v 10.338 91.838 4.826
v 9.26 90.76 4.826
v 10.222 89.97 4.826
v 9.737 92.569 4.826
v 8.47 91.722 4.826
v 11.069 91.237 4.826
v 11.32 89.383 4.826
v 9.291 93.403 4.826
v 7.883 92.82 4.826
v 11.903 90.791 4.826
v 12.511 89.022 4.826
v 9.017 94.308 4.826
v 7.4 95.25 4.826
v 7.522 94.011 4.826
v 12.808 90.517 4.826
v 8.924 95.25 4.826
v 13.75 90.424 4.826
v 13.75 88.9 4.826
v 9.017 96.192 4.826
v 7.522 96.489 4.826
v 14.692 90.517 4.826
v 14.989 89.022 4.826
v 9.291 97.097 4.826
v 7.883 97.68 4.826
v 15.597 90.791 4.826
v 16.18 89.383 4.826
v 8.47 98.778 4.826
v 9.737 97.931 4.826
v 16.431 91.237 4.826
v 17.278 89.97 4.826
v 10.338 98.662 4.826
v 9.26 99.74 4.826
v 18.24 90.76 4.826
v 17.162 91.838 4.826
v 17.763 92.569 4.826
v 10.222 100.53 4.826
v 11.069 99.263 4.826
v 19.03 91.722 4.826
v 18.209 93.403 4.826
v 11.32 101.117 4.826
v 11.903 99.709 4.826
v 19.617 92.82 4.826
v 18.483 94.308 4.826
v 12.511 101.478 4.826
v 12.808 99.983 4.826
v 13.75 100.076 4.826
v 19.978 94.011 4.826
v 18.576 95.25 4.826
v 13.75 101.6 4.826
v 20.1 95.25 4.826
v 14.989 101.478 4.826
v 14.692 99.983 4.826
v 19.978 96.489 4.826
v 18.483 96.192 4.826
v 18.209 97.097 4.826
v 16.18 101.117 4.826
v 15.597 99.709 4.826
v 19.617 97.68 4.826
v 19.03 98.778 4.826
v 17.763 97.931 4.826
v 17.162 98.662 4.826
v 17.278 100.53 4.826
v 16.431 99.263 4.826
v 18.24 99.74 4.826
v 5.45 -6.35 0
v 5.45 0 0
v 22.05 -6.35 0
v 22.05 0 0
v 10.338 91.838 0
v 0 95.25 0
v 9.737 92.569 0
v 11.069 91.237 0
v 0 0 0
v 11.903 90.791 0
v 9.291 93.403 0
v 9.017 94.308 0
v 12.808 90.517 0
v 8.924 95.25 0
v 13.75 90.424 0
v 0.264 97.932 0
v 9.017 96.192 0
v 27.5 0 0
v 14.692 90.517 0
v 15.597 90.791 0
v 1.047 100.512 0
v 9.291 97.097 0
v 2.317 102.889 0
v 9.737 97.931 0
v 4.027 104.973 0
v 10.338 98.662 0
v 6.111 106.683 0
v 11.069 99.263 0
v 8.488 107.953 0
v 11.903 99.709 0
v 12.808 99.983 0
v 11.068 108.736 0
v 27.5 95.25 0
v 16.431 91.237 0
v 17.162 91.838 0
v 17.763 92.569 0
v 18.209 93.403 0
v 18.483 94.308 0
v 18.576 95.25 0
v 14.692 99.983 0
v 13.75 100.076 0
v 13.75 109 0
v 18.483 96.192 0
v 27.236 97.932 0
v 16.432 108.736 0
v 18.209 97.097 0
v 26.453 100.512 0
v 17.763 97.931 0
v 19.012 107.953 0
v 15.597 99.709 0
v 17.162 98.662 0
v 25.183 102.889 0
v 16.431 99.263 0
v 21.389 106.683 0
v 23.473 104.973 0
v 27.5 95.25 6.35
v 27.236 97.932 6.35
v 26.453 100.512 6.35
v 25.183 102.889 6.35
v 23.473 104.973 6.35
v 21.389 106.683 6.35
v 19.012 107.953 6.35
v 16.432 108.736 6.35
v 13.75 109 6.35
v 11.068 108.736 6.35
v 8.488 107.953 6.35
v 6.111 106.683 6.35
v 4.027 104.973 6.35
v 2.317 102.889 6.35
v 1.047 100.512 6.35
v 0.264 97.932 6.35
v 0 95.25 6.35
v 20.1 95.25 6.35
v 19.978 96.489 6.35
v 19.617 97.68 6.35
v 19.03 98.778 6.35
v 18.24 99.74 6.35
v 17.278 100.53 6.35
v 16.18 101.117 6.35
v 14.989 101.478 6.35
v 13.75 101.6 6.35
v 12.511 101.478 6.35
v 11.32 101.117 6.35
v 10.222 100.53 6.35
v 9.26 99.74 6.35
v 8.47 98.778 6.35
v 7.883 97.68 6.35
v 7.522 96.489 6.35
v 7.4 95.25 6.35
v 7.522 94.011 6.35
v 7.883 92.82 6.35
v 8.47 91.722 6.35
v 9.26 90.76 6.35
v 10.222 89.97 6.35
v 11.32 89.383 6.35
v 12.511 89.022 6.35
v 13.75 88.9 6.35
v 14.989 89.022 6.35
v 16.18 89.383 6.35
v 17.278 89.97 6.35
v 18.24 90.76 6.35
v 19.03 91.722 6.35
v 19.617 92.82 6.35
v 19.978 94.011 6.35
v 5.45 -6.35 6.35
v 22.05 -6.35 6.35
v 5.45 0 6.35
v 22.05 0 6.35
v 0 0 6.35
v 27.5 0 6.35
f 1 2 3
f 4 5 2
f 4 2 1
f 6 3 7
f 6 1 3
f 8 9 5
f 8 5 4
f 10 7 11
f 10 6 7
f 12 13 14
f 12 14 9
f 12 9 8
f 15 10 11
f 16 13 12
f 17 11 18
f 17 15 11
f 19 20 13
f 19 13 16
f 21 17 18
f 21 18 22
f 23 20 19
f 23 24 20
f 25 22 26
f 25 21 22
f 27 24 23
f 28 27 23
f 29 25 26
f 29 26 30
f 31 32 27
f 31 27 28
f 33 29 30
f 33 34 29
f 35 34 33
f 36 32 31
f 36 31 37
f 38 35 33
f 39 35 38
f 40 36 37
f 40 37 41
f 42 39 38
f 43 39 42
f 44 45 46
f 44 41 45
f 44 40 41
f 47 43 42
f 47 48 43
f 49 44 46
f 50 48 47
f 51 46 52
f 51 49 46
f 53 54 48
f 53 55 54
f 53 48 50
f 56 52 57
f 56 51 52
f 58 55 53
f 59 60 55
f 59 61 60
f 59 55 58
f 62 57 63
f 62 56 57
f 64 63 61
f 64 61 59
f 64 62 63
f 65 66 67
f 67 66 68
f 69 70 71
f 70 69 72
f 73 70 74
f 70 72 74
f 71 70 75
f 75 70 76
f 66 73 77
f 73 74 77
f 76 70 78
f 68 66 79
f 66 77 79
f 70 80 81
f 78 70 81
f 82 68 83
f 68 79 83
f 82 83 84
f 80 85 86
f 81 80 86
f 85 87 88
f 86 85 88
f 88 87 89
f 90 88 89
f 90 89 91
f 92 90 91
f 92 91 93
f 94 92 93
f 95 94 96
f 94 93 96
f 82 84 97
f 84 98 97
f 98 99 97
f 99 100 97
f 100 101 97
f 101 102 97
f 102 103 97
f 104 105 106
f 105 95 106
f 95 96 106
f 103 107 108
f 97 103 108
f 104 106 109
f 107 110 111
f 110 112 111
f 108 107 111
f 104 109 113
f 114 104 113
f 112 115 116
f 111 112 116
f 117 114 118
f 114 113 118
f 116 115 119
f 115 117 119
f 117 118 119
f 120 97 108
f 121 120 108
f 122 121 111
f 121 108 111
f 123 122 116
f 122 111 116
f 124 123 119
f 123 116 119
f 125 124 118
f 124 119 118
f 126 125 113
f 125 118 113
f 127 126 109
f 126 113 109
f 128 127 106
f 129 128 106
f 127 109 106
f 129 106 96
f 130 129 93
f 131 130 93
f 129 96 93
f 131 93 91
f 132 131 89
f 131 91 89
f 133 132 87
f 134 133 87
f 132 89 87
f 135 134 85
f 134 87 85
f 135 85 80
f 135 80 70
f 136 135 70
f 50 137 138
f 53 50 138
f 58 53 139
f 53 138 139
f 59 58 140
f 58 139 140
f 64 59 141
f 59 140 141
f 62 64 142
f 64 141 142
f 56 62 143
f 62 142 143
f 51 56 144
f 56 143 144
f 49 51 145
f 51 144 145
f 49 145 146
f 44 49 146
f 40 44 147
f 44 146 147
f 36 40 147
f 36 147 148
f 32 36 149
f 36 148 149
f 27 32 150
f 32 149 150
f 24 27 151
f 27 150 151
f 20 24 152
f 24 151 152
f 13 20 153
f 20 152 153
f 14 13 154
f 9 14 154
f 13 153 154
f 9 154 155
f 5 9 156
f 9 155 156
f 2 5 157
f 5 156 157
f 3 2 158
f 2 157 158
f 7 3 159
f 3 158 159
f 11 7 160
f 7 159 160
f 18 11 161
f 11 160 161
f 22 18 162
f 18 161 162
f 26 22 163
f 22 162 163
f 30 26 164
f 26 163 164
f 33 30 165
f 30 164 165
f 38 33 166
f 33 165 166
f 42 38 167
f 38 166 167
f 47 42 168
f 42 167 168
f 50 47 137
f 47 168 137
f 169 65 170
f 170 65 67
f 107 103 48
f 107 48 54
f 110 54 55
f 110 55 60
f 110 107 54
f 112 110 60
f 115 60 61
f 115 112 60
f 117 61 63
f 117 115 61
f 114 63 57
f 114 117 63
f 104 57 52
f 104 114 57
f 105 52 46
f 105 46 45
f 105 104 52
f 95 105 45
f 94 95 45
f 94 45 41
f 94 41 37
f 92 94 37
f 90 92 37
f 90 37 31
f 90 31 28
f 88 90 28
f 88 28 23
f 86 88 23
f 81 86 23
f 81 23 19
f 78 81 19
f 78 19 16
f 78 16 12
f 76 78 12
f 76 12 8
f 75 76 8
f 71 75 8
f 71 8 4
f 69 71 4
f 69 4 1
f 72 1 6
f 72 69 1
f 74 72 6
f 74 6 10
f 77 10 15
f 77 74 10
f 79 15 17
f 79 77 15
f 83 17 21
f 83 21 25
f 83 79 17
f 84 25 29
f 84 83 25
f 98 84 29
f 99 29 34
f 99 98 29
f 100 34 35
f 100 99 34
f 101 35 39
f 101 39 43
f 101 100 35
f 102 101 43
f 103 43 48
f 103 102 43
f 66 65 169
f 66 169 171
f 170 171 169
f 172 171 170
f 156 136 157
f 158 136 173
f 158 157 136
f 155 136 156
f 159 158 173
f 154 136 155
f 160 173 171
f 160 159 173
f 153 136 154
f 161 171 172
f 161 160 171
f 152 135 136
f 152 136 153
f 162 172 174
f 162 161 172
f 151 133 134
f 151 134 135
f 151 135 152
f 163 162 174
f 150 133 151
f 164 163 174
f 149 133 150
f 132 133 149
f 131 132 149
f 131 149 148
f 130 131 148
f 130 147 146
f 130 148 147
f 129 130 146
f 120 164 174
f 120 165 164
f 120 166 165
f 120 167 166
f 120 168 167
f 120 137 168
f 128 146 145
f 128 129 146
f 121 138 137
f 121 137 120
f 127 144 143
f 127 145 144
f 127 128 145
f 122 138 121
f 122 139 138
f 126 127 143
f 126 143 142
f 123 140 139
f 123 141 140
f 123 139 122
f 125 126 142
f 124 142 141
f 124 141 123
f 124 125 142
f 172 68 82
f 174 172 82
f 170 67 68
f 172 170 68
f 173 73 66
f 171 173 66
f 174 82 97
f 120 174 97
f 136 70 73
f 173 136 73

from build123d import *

# Parameters (mm, degrees)
SKETCH1_R           = 4.826
SKETCH1_W           = 16.600988984
SKETCH1_H           = 6.35
BOSS_EXTRUDE1_DEPTH = 6.35
SKETCH2_R           = 6.35
SKETCH2_R_2         = 4.826
CUT_EXTRUDE1_DEPTH  = 1.524


with BuildPart() as part:
    # Sketch1 → Boss-Extrude1 (new body)
    with BuildSketch(Plane.XY):
        with BuildLine():
            Line((0, 0), (27.5, 0))
            Line((27.5, 0), (27.5, 95.25))
            ThreePointArc((27.5, 95.25), (13.75, 109), (0, 95.25))
            Line((0, 95.25), (0, 0))
        make_face()
        with Locations((13.75, 95.25)):
            Circle(SKETCH1_R, mode=Mode.SUBTRACT)
        with Locations((13.75, -3.175)):
            Rectangle(SKETCH1_W, SKETCH1_H)
    extrude(amount=BOSS_EXTRUDE1_DEPTH)

    # Sketch2 → Cut-Extrude1 (cut)
    with BuildSketch(Plane.XY.offset(6.35)):
        with Locations((13.75, 95.25)):
            Circle(SKETCH2_R)
        with Locations((13.75, 95.25)):
            Circle(SKETCH2_R_2, mode=Mode.SUBTRACT)
    extrude(amount=-CUT_EXTRUDE1_DEPTH, mode=Mode.SUBTRACT)


solid = part.part
